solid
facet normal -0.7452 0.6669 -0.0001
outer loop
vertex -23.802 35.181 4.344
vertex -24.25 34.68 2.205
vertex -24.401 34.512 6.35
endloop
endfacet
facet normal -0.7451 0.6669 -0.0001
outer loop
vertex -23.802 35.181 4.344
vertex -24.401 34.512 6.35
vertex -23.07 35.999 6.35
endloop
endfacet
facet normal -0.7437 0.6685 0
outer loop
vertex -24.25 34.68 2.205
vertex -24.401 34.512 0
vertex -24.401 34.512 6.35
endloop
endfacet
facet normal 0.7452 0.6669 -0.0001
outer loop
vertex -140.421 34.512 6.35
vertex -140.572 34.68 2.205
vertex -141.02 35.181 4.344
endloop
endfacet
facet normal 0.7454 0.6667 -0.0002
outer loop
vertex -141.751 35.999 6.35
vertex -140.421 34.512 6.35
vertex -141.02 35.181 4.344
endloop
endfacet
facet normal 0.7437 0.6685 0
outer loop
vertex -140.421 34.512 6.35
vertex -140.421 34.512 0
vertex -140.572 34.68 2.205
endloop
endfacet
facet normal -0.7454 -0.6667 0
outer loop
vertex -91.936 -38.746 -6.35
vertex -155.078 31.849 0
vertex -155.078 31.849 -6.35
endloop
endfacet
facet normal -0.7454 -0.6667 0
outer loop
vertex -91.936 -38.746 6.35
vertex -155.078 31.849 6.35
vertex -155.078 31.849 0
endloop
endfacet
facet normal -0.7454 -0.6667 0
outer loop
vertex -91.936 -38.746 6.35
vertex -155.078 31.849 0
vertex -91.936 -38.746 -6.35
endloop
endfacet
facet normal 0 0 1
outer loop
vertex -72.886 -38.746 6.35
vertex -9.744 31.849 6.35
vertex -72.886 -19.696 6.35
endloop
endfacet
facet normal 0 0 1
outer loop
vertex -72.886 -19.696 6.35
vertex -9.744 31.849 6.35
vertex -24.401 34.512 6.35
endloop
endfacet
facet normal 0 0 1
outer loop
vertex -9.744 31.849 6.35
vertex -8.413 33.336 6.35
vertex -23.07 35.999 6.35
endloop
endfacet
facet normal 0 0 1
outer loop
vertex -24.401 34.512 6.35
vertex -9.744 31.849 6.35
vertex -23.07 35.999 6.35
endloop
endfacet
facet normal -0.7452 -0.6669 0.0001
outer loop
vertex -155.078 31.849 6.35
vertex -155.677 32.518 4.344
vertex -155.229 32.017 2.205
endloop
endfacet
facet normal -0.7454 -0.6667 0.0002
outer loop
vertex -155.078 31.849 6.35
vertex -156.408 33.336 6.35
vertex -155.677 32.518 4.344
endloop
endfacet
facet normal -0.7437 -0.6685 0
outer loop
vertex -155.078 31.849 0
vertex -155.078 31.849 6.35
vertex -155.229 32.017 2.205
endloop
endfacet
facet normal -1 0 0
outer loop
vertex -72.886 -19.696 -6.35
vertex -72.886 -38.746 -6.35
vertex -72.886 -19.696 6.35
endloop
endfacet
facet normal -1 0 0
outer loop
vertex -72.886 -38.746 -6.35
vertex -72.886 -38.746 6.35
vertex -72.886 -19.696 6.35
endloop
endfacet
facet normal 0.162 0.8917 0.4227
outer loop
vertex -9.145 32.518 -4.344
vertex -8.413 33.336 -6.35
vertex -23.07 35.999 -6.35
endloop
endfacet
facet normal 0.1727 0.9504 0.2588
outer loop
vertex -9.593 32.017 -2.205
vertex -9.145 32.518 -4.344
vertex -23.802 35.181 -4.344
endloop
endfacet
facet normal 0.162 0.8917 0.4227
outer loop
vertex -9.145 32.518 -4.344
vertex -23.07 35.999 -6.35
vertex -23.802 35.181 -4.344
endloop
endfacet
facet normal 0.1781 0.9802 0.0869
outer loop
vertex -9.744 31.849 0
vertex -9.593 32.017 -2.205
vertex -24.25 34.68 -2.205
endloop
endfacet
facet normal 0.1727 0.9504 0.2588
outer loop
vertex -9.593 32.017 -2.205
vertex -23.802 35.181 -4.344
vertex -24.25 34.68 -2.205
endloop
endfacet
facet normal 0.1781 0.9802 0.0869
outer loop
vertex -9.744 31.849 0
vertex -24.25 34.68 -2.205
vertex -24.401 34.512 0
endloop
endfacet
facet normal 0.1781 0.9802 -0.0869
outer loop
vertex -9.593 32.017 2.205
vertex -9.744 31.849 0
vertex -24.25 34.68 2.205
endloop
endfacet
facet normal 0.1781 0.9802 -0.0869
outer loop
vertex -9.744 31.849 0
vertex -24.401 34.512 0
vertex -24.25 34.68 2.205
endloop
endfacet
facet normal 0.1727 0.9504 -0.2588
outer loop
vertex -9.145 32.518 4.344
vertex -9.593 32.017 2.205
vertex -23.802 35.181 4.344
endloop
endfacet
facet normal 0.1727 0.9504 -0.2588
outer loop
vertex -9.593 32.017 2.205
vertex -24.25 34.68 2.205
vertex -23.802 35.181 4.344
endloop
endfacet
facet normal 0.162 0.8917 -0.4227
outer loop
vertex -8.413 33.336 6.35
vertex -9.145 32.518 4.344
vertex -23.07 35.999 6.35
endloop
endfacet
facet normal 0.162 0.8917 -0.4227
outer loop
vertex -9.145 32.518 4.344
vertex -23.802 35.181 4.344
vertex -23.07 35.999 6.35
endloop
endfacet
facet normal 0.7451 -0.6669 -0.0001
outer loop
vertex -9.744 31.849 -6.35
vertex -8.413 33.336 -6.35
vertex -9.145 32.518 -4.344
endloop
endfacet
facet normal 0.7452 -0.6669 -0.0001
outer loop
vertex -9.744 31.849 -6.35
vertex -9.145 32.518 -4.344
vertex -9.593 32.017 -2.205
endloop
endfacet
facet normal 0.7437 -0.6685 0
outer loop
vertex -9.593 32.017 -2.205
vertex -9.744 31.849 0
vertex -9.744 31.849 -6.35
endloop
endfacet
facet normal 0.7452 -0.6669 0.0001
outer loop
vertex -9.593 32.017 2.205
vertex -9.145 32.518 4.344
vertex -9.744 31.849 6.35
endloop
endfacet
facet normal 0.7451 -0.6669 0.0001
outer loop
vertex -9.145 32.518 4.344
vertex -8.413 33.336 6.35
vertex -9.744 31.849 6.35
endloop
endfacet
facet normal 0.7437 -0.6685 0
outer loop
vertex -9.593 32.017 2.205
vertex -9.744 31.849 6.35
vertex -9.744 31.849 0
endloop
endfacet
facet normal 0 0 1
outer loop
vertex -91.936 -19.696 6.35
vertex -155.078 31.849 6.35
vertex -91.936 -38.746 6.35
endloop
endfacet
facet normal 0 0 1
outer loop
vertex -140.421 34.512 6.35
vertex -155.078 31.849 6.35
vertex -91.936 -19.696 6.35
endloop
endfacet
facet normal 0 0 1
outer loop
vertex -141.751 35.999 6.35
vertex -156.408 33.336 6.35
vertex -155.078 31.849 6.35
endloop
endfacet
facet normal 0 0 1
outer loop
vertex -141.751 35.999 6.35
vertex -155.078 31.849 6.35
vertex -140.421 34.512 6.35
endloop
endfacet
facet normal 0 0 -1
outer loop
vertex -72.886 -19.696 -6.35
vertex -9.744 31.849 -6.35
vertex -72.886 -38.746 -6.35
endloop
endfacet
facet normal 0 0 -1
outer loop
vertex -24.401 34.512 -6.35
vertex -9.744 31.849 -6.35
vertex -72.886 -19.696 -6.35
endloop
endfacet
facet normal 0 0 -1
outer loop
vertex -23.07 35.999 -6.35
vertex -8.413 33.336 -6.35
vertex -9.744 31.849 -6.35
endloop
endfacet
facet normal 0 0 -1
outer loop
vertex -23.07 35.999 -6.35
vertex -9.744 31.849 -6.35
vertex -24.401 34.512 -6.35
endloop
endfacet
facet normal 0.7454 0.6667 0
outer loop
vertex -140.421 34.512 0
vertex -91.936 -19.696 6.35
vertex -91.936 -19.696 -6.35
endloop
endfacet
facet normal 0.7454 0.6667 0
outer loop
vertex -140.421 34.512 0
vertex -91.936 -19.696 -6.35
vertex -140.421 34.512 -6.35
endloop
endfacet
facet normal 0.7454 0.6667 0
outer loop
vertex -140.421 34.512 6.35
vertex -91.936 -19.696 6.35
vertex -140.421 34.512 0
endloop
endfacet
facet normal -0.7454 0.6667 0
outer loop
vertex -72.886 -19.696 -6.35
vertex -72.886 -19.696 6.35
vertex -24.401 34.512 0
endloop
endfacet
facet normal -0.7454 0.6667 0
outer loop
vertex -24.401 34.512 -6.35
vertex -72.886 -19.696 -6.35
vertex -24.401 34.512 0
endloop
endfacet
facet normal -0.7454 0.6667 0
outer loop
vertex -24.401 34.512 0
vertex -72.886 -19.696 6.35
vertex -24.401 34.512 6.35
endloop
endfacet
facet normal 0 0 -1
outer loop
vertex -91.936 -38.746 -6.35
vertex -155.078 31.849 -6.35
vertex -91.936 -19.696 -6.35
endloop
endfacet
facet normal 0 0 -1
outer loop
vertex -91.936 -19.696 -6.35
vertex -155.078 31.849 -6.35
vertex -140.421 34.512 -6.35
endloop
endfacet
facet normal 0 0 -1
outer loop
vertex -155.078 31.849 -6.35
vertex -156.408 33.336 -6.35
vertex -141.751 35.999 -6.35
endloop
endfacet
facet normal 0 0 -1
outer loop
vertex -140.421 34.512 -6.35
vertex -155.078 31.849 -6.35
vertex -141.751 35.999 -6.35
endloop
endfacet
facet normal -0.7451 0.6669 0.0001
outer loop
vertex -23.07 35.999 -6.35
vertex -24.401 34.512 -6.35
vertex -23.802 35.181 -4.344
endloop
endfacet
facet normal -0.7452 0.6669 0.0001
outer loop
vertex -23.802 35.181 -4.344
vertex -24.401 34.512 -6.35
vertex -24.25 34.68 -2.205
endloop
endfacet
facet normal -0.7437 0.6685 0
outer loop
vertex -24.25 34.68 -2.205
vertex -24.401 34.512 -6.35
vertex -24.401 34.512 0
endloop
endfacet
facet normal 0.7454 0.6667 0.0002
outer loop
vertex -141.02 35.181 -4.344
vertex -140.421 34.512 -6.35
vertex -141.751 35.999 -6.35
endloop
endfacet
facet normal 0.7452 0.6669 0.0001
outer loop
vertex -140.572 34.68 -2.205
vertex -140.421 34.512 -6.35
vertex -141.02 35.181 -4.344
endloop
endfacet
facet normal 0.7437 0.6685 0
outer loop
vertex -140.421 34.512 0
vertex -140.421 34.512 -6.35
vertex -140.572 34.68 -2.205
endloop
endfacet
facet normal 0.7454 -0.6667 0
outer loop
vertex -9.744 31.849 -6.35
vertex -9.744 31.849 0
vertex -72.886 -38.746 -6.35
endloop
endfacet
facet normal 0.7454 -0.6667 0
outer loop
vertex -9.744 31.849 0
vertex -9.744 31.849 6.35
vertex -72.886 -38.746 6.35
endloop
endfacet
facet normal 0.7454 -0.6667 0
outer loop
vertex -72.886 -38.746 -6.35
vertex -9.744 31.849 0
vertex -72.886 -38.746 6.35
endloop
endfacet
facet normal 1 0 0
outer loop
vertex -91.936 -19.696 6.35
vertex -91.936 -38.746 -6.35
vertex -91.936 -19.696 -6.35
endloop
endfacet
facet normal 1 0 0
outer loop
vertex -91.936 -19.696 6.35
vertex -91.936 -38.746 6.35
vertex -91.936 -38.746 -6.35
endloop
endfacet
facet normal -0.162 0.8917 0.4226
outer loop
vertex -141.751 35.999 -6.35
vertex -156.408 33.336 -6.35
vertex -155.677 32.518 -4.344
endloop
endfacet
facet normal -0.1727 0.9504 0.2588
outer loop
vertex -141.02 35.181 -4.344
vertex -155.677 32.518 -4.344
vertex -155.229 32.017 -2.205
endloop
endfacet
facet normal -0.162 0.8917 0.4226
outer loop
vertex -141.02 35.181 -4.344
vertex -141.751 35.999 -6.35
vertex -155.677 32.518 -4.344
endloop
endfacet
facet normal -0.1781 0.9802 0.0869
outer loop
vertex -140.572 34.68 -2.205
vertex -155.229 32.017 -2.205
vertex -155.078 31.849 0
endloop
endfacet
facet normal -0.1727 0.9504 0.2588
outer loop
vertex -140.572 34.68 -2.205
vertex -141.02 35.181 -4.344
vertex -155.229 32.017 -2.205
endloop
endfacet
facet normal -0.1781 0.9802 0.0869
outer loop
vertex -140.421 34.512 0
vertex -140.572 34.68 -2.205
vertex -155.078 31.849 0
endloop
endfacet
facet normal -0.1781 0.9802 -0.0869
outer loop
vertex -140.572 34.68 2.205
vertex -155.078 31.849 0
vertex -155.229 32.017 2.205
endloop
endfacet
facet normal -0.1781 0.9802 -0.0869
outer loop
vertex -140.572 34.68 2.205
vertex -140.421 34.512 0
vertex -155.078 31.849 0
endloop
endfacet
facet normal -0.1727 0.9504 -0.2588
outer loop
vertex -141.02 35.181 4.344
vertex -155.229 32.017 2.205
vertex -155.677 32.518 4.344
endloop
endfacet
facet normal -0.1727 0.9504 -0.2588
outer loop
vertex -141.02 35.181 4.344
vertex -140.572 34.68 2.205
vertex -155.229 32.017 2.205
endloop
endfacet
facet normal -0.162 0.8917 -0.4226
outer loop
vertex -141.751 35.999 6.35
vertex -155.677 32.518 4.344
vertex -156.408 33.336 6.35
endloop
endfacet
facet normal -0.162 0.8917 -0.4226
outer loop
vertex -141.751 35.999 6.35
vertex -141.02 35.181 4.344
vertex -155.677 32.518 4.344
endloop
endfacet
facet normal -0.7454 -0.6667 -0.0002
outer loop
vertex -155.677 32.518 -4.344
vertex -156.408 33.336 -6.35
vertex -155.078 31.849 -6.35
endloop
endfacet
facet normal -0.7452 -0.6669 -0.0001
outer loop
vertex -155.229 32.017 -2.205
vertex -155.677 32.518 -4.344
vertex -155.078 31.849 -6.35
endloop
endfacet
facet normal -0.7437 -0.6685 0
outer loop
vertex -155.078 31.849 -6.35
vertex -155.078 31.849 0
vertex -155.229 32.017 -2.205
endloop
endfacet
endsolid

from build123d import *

# Parameters (mm, degrees)
BOSS_EXTRUDE1_DEPTH      = 6.35
BOSS_EXTRUDE1_DEPTH_BACK = 6.35
CUT_EXTRUDE2_DEPTH       = 50.8
CUT_EXTRUDE2_DEPTH_BACK  = 50.8
SKETCH7_R                = 12.7


with BuildPart() as part:
    # Sketch1 → Boss-Extrude1 (new, two sides: drawn at the far end of the back side and taken through both)
    with BuildSketch(Plane.XY.offset(-BOSS_EXTRUDE1_DEPTH_BACK)):
        Polygon((-91.935614725, -38.746248277), (-91.935614725, -19.696248277), (-140.420626518, 34.511642852), (-161.42071071, 57.990450746), (-176.077722952, 55.327488605), (-155.07763876, 31.848680712), align=None)
    extrude(amount=BOSS_EXTRUDE1_DEPTH + BOSS_EXTRUDE1_DEPTH_BACK)

    # Sketch7 → Cut-Extrude2 (cut, two sides: drawn at the far end of the back side and taken through both)
    with BuildSketch(Plane(origin=(-129.863636853, -23.594300302, 0), x_dir=(0, 0, 1), z_dir=(-0.9838929304749452, -0.17875877981633442, 0)).offset(-CUT_EXTRUDE2_DEPTH_BACK)):
        with Locations((0, 71.757181279)):
            Circle(SKETCH7_R)
    extrude(amount=CUT_EXTRUDE2_DEPTH + CUT_EXTRUDE2_DEPTH_BACK, mode=Mode.SUBTRACT)


with BuildPart() as cut_extrude2_kept_piece:
    # of the separate pieces the step leaves, the one the design keeps (cut_extrude2_pieces_kept)
    add(part.part.solids().sort_by_distance((-91.935614725, -38.746248277, 6.35))[0])


with BuildPart() as body_2:
    # Mirror6: mirrored copy
    add(cut_extrude2_kept_piece.part.mirror(Plane(origin=(-82.410614725, 0, 0), x_dir=(0, 0, 1), z_dir=(1, 0, 0))))


solid = Compound([cut_extrude2_kept_piece.part, body_2.part])
